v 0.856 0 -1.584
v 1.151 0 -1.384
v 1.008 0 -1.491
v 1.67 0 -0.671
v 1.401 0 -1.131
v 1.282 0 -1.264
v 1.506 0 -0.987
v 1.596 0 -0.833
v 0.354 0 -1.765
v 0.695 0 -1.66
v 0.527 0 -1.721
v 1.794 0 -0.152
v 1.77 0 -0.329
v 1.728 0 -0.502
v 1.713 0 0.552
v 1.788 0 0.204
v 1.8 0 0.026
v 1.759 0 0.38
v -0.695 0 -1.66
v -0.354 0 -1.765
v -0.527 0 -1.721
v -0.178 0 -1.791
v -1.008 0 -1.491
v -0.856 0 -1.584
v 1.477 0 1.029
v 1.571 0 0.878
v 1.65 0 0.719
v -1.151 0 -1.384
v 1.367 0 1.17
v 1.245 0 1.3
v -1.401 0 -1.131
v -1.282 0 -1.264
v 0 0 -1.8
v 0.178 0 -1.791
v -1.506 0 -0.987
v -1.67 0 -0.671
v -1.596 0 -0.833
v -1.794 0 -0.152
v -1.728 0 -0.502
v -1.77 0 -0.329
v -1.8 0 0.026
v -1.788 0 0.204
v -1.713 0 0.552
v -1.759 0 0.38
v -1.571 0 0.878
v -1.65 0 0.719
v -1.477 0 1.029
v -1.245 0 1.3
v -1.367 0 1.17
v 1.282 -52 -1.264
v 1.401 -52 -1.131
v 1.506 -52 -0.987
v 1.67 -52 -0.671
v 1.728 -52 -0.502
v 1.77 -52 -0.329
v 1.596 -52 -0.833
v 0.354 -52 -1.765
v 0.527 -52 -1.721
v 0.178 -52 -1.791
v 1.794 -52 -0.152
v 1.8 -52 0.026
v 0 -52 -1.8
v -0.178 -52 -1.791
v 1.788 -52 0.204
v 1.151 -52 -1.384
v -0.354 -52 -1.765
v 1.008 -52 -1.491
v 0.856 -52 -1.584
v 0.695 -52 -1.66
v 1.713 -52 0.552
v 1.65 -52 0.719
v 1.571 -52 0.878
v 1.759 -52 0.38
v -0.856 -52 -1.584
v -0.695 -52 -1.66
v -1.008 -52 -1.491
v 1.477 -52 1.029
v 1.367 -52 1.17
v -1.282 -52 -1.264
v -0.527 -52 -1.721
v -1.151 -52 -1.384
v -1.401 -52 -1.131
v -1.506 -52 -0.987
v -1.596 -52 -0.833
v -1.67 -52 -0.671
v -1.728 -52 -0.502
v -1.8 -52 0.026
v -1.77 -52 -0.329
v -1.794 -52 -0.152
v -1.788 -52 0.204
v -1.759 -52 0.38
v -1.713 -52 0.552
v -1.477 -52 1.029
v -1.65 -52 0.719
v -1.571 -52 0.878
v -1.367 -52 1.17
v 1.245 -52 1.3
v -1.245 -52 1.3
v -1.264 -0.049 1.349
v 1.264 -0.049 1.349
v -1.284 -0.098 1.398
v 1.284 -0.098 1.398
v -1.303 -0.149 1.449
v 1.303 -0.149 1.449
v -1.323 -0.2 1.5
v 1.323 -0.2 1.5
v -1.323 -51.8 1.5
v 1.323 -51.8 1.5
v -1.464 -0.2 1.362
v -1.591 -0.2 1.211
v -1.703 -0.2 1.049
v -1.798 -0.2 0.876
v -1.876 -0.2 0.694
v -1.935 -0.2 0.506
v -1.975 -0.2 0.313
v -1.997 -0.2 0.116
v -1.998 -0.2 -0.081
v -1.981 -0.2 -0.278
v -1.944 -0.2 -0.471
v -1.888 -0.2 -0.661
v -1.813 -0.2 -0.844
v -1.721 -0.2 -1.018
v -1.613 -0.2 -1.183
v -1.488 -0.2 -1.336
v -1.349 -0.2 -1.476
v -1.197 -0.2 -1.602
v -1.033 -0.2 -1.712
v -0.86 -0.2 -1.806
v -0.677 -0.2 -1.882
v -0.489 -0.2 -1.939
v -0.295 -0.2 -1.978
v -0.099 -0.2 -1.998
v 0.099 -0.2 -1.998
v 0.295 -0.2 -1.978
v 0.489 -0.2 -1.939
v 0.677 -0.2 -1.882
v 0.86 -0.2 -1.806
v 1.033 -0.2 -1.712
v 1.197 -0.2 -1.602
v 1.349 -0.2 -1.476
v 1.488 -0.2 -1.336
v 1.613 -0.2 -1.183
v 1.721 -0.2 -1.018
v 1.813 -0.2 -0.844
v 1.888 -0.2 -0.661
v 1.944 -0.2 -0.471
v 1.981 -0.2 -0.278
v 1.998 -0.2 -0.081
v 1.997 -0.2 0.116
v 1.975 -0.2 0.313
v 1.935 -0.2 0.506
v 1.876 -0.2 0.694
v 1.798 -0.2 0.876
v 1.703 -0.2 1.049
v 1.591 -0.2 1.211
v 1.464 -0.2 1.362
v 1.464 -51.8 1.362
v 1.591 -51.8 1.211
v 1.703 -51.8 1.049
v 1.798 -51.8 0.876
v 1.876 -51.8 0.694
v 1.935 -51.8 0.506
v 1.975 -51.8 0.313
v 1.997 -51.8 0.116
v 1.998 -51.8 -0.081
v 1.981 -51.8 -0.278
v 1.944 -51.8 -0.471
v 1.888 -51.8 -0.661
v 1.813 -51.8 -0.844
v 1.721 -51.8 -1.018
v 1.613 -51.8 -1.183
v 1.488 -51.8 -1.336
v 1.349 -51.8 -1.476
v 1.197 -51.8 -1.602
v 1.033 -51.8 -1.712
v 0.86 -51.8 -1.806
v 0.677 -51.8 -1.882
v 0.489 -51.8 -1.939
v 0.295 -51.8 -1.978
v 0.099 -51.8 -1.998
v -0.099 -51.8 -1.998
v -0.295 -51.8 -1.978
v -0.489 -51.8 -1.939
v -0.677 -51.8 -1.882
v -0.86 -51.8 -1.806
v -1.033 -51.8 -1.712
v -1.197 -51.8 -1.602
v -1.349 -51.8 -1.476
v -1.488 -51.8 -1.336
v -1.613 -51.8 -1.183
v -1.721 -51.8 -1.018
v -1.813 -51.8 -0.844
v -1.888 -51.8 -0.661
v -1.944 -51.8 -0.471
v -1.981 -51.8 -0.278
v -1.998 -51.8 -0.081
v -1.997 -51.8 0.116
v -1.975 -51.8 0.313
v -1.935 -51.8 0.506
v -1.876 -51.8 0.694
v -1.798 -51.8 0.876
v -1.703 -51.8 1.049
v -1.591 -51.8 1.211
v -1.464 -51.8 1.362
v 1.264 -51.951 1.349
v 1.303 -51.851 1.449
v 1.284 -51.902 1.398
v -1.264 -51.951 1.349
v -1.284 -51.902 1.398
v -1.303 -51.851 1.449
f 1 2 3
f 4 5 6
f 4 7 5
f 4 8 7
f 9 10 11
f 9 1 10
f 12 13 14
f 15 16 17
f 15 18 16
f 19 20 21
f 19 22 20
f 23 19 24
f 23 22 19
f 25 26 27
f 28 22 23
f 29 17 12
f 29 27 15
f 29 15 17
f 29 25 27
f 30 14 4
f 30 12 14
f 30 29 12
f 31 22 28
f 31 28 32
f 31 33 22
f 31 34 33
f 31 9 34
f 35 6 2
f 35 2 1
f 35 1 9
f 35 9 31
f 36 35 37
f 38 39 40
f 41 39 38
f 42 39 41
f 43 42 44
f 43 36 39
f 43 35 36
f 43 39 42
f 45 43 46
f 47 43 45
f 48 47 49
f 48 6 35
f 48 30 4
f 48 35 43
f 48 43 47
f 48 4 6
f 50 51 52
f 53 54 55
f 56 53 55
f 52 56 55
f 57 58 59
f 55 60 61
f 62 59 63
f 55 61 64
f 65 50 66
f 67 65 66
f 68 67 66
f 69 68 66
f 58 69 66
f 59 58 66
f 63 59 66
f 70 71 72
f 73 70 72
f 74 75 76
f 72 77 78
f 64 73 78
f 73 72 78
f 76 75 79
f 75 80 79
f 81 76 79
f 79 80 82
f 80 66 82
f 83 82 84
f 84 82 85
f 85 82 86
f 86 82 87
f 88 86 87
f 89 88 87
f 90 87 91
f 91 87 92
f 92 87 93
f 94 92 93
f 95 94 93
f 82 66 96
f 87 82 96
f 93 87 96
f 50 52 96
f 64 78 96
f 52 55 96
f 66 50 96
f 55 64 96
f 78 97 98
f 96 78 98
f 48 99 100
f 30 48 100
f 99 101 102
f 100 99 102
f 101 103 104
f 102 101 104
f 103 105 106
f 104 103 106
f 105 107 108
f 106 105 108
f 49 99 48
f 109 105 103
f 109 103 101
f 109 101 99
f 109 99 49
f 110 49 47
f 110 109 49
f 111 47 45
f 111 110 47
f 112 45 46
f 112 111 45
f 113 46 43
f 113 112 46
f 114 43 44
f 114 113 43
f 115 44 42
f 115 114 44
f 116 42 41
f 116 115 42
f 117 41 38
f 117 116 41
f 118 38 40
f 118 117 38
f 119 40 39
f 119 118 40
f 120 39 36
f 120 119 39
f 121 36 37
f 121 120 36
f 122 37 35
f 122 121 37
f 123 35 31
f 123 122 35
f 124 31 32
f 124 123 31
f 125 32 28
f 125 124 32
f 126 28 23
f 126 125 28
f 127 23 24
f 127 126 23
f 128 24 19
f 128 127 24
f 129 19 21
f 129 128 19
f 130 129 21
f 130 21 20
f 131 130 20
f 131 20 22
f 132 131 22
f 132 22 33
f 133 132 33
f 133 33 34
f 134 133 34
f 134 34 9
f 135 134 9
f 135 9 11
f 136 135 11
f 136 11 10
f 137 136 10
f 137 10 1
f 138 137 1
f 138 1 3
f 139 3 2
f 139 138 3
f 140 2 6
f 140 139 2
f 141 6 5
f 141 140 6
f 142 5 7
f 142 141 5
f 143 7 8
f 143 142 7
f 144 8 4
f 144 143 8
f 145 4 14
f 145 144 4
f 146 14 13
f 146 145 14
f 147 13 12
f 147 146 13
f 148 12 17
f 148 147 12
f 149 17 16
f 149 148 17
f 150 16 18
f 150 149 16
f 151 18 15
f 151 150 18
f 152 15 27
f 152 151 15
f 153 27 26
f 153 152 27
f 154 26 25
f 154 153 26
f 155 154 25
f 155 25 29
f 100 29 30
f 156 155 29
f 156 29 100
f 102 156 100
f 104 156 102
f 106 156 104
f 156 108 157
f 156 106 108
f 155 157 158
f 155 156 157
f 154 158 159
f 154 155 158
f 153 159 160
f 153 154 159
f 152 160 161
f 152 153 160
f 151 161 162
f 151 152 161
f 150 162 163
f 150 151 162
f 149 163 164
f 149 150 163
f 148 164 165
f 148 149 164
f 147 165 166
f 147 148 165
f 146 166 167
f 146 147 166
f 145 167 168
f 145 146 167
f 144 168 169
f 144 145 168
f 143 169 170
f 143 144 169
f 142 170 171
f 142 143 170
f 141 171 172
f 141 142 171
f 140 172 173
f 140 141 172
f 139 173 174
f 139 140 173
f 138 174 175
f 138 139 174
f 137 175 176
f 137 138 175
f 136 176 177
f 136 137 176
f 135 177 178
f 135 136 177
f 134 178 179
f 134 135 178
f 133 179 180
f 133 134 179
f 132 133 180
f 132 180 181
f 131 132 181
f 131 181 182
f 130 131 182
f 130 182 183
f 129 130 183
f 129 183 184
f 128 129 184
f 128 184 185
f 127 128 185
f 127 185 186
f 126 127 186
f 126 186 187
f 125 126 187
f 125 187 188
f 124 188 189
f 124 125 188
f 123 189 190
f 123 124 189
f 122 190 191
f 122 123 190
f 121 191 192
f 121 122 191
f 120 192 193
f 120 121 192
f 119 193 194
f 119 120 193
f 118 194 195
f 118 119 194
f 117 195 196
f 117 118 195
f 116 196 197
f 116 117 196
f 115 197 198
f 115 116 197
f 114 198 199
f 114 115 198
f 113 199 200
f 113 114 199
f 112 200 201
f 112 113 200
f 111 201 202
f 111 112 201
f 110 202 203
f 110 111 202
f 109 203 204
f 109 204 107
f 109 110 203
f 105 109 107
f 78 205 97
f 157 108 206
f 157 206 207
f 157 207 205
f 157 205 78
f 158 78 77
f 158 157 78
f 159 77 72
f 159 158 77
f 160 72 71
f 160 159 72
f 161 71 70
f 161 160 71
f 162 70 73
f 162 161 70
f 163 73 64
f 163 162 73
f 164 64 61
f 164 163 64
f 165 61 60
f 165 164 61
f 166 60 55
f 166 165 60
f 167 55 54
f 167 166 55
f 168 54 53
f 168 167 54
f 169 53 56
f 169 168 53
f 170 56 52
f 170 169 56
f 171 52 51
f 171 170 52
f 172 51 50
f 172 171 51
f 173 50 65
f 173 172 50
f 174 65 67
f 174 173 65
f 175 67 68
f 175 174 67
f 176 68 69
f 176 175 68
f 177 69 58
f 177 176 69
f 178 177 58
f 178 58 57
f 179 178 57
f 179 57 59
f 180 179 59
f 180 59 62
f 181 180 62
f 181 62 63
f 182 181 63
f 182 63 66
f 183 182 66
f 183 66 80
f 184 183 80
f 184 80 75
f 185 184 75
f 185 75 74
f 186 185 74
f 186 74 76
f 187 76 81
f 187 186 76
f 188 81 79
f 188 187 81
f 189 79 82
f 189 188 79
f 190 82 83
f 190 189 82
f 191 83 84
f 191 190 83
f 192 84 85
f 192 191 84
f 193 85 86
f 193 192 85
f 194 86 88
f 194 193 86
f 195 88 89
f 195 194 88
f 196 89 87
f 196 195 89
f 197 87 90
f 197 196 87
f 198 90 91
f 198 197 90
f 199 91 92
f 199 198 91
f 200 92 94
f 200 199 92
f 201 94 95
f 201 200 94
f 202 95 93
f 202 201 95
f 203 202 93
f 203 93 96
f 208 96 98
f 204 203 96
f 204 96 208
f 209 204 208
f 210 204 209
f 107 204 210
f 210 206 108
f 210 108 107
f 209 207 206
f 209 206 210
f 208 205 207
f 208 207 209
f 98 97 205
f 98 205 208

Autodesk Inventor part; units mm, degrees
ref_plane "YZ Plane" through (0, 0, 0) normal (1, 0, 0) x (0, 1, 0)
ref_plane "XZ Plane" through (0, 0, 0) normal (0, 1, 0) x (-1, 0, 0)
ref_plane "XY Plane" through (0, 0, 0) normal (0, 0, 1) x (1, 0, 0)
sketch "Sketch1" plane through (0, 0, 0) normal (0, 1, 0) x (-1, 0, 0)
  circle A0 centre (0, 0) radius 2
  dimension "d0" = 4
extrude "Extrusion1" add sketch "Sketch1" against normal blind 52
sketch "Sketch2" plane through (0, -52, 0) normal (0, -1, 0) x (1, 0, 0)
  circle A0 centre (0, 0) radius 2 projected
  line L0 (-1.3229, 1.5) -> (1.3229, 1.5)
  circle A1 centre (0, 0) radius 2 projected
  dimension "d3" = 0.5
extrude "Extrusion2" cut sketch "Sketch2" against normal through all contours L0 A0 picked at (-0.3089, 1.5908)
chamfer "Chamfer1" distance 0.2 angle 45 4 edges at (0, -52, -2) (0, -52, 1.5) (0, 0, -2) (0, 0, 1.5)
properties part number "10-0052" material "Aluminum 6061"
